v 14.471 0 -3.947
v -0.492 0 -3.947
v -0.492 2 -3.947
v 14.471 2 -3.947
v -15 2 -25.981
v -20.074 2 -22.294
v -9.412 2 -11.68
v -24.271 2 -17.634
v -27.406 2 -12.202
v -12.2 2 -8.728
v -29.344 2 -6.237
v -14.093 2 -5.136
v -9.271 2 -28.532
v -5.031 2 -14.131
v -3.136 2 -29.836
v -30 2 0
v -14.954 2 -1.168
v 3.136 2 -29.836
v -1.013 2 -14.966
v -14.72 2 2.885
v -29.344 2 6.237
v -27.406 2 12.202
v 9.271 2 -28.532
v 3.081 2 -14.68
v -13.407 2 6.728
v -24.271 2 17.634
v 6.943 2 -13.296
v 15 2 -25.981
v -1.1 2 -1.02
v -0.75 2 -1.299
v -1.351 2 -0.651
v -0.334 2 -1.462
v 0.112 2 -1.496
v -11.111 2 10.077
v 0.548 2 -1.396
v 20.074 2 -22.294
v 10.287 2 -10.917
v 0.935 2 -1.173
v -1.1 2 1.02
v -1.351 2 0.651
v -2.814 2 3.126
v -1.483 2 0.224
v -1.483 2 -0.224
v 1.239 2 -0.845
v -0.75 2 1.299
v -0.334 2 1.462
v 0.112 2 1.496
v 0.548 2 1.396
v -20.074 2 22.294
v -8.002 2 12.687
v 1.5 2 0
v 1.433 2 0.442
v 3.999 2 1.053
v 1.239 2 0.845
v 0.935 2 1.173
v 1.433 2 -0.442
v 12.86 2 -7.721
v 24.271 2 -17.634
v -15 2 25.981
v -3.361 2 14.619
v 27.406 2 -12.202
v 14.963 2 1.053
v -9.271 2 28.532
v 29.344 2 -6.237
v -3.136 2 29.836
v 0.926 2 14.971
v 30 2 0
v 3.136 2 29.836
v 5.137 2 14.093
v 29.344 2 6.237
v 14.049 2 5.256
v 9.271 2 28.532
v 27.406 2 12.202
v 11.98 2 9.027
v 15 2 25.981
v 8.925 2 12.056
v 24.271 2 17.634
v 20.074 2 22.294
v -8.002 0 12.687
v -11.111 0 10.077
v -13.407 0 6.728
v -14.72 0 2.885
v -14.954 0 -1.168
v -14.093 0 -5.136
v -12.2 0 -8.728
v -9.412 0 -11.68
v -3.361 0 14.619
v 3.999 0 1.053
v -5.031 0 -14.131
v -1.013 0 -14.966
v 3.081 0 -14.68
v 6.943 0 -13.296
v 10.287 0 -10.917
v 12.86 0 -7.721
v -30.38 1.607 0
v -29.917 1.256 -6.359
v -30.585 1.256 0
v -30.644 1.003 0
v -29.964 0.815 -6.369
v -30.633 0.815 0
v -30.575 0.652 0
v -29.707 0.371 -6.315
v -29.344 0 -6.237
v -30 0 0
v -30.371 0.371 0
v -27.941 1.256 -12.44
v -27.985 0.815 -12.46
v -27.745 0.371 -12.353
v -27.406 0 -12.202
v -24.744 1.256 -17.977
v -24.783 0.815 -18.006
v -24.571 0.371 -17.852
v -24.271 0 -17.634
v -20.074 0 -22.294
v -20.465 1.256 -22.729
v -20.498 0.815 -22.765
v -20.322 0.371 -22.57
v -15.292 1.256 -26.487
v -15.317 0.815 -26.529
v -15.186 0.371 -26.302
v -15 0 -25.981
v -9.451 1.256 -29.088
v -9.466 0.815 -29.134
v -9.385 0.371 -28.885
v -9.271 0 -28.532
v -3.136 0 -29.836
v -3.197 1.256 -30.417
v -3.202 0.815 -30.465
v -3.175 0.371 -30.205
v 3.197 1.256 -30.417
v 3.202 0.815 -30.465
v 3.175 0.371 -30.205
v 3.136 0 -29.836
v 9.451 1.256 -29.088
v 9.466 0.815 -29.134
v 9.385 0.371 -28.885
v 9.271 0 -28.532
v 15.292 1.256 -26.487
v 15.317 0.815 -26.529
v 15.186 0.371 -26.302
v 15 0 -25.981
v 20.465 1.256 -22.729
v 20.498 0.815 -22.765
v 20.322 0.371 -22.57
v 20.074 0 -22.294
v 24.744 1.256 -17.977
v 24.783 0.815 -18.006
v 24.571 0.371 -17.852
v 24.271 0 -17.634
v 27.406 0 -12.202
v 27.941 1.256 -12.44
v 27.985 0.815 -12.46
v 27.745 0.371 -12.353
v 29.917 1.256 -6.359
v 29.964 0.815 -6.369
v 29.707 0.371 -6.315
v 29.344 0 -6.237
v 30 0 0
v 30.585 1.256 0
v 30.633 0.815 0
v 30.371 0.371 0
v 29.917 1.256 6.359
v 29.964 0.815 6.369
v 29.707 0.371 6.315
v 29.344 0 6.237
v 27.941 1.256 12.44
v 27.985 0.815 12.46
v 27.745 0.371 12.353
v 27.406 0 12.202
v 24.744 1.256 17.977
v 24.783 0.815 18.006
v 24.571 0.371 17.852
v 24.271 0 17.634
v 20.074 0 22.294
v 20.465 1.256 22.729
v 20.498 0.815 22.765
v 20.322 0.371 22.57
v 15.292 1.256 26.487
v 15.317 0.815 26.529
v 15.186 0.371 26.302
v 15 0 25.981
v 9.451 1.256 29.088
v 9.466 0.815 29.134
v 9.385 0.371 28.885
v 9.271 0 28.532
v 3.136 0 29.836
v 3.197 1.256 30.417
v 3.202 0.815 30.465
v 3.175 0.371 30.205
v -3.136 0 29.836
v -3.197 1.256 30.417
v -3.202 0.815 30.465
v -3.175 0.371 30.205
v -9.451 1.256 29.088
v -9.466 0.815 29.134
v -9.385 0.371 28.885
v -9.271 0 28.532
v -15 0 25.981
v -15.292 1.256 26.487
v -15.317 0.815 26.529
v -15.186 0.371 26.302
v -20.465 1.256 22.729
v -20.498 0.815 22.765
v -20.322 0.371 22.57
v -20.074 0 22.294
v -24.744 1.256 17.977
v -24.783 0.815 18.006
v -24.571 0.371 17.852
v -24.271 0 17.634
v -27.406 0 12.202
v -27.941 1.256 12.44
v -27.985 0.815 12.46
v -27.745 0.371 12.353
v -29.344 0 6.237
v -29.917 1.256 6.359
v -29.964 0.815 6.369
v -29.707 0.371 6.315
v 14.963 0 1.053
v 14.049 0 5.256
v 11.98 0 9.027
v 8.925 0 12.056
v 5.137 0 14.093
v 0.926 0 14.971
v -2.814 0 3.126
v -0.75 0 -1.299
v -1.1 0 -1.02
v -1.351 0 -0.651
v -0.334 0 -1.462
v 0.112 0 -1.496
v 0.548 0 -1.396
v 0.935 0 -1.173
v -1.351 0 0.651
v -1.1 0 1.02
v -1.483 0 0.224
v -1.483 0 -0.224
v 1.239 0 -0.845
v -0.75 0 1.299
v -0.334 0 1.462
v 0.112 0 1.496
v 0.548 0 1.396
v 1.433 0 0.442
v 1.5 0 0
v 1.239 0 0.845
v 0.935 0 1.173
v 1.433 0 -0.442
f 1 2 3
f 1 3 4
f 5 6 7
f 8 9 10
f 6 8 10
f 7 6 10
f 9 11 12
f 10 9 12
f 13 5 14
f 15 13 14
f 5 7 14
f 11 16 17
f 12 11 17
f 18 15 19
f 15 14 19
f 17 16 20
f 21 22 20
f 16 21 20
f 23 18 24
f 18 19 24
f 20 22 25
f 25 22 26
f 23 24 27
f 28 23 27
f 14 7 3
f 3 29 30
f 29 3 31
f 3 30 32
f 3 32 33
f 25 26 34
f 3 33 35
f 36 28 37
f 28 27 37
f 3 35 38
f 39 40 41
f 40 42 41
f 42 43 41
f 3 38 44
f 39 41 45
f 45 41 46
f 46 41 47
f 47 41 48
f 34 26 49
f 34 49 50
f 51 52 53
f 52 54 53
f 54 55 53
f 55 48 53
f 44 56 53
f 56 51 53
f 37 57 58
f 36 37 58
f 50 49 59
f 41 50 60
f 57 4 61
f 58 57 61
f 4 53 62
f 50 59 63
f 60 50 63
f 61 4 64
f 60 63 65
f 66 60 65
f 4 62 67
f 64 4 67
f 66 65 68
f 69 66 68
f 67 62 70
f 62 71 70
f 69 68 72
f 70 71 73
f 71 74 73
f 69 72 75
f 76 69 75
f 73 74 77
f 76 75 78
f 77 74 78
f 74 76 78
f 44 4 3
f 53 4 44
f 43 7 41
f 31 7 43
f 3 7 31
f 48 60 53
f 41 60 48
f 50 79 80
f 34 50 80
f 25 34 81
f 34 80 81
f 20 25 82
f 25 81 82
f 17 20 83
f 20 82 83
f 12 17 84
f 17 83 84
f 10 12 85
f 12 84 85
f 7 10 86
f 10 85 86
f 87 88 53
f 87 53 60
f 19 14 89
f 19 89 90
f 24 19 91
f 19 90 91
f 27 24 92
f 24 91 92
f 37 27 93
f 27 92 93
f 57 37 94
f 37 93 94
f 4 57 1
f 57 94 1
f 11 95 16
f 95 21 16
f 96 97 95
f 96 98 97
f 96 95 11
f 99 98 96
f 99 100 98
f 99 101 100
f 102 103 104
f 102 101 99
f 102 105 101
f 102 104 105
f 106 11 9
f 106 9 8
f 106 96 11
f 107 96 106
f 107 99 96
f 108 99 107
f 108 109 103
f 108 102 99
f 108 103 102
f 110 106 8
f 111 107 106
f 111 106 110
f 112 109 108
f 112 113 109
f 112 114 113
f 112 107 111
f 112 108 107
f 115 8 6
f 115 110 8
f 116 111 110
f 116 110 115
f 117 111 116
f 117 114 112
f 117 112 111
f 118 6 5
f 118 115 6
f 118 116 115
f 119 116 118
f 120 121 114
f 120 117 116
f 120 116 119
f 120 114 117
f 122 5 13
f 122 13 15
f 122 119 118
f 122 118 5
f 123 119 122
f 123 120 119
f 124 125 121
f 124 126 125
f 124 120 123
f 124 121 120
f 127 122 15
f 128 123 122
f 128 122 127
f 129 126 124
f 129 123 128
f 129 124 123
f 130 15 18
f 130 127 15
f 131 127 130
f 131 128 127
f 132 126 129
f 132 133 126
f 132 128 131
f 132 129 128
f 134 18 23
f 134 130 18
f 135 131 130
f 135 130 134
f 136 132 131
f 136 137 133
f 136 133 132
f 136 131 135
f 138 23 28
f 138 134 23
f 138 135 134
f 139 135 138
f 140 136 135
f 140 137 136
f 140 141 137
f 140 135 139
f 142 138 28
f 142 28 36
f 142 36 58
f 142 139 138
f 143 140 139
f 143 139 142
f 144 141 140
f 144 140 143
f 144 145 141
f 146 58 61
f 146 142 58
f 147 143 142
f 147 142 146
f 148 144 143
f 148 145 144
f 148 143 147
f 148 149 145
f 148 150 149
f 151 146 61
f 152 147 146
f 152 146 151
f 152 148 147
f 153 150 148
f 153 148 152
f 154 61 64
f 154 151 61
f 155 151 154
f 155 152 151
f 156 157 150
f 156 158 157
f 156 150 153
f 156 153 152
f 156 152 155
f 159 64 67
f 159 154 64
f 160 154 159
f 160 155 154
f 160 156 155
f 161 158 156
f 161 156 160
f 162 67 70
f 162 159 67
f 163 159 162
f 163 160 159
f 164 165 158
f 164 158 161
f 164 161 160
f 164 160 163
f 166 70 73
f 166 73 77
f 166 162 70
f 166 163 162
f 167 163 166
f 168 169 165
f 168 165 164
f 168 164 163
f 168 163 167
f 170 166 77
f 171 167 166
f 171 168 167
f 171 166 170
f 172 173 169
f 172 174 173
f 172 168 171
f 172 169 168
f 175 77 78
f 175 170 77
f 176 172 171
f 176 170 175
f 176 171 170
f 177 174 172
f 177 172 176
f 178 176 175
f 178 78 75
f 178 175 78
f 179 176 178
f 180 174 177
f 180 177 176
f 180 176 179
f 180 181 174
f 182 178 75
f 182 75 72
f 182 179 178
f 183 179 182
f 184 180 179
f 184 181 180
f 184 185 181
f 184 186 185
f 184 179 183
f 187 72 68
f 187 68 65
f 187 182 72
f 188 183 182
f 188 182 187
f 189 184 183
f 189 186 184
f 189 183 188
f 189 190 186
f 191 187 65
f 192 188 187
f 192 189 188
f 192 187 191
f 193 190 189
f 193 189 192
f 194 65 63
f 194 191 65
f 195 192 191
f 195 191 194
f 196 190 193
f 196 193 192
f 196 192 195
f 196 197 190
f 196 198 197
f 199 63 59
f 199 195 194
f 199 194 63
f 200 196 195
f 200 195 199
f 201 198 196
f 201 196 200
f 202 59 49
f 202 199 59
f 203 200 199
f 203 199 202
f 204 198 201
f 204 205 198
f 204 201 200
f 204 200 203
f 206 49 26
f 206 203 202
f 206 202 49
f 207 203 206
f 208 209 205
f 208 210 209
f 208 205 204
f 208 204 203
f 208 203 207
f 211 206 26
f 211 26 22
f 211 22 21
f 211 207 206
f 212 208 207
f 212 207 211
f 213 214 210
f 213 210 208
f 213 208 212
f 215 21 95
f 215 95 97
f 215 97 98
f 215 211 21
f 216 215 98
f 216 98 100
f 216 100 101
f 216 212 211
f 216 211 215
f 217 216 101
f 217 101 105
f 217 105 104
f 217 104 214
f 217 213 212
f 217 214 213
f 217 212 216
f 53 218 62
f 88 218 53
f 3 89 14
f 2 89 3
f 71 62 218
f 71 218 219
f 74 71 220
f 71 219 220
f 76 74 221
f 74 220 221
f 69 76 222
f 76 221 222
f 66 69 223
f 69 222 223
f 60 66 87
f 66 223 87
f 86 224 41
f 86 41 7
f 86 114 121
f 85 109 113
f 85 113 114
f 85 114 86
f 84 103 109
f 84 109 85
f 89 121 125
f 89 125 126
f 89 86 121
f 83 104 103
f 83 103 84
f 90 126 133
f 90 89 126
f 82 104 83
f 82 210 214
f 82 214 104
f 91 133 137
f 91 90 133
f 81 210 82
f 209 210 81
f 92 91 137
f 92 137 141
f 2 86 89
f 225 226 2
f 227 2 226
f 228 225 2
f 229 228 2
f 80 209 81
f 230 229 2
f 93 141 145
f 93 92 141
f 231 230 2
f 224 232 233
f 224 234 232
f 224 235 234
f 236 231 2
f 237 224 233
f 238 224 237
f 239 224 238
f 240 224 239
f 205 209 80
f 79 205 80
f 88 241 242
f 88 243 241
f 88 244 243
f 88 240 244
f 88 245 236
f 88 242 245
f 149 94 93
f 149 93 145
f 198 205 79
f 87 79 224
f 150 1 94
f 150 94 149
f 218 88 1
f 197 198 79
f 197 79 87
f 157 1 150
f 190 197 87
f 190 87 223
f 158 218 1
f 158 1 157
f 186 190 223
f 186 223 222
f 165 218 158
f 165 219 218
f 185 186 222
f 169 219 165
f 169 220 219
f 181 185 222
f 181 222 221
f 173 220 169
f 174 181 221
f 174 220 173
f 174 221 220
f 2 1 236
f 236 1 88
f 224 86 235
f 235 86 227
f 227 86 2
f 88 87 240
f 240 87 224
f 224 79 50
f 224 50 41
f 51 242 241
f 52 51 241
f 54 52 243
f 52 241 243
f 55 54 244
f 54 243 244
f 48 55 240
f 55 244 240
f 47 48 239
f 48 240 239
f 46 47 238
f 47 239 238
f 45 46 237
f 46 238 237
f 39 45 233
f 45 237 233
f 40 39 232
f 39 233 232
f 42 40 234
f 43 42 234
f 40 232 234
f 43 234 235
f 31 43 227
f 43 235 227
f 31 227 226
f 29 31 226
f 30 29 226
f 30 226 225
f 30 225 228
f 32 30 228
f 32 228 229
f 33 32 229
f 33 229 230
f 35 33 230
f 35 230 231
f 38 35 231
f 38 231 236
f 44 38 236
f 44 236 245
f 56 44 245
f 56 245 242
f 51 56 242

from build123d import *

# Parameters (mm, degrees)
F2_R     = 15
F2_R_2   = 3.5
F2_R_3   = 1.5
F3_DEPTH = 1000
F5_DEPTH = 2
F6_DEPTH = 10050


with BuildPart() as f1:
    # F0 (on Top) → F1 (revolve)
    with BuildSketch(Plane.XY):
        with BuildLine():
            Line((-30, 0), (0, 0))
            Line((0, 0), (0, 2))
            Line((0, 2), (-30, 2))
            add(Edge.make_bspline(
                [(-30, 2), (-30.4910149425, 1.5771952458), (-30.8094289155, 0.8702388721), (-30.4755121469, 0.4455515009), (-30, 0)],
                knots=[0, 0, 0, 0, 0.5130266248, 1, 1, 1, 1], degree=3))
        make_face()
    revolve(axis=Axis((0, 1, 0), (0, -1, 0)))

    # F2 (on Front) → F3 (cut)
    with BuildSketch(Plane.XZ):
        Circle(F2_R)
        Circle(F2_R_2, mode=Mode.SUBTRACT)
        Circle(F2_R_3)
    extrude(amount=-F3_DEPTH, mode=Mode.SUBTRACT)

    # F4 (on Front) → F5 (join)
    with BuildSketch(Plane.XZ):
        Polygon((-2.8139011922, 3.1256922416), (-9.7019712724, -12.3303449528), (-5.1349687969, -14.365655344), (-0.4918737939, -3.9470840711), (16.5167228414, -3.9470840711), (16.5167228414, 1.0529159289), (3.999228884, 1.0529159289), (-4.3775779681, 16.4923113486), (-8.7723915503, 14.1078588795), align=None)
    extrude(amount=-F5_DEPTH)

    # F2 (on Front) → F6 (cut)
    with BuildSketch(Plane.XZ):
        Circle(F2_R_3)
    extrude(amount=-F6_DEPTH, mode=Mode.SUBTRACT)


solid = f1.part
